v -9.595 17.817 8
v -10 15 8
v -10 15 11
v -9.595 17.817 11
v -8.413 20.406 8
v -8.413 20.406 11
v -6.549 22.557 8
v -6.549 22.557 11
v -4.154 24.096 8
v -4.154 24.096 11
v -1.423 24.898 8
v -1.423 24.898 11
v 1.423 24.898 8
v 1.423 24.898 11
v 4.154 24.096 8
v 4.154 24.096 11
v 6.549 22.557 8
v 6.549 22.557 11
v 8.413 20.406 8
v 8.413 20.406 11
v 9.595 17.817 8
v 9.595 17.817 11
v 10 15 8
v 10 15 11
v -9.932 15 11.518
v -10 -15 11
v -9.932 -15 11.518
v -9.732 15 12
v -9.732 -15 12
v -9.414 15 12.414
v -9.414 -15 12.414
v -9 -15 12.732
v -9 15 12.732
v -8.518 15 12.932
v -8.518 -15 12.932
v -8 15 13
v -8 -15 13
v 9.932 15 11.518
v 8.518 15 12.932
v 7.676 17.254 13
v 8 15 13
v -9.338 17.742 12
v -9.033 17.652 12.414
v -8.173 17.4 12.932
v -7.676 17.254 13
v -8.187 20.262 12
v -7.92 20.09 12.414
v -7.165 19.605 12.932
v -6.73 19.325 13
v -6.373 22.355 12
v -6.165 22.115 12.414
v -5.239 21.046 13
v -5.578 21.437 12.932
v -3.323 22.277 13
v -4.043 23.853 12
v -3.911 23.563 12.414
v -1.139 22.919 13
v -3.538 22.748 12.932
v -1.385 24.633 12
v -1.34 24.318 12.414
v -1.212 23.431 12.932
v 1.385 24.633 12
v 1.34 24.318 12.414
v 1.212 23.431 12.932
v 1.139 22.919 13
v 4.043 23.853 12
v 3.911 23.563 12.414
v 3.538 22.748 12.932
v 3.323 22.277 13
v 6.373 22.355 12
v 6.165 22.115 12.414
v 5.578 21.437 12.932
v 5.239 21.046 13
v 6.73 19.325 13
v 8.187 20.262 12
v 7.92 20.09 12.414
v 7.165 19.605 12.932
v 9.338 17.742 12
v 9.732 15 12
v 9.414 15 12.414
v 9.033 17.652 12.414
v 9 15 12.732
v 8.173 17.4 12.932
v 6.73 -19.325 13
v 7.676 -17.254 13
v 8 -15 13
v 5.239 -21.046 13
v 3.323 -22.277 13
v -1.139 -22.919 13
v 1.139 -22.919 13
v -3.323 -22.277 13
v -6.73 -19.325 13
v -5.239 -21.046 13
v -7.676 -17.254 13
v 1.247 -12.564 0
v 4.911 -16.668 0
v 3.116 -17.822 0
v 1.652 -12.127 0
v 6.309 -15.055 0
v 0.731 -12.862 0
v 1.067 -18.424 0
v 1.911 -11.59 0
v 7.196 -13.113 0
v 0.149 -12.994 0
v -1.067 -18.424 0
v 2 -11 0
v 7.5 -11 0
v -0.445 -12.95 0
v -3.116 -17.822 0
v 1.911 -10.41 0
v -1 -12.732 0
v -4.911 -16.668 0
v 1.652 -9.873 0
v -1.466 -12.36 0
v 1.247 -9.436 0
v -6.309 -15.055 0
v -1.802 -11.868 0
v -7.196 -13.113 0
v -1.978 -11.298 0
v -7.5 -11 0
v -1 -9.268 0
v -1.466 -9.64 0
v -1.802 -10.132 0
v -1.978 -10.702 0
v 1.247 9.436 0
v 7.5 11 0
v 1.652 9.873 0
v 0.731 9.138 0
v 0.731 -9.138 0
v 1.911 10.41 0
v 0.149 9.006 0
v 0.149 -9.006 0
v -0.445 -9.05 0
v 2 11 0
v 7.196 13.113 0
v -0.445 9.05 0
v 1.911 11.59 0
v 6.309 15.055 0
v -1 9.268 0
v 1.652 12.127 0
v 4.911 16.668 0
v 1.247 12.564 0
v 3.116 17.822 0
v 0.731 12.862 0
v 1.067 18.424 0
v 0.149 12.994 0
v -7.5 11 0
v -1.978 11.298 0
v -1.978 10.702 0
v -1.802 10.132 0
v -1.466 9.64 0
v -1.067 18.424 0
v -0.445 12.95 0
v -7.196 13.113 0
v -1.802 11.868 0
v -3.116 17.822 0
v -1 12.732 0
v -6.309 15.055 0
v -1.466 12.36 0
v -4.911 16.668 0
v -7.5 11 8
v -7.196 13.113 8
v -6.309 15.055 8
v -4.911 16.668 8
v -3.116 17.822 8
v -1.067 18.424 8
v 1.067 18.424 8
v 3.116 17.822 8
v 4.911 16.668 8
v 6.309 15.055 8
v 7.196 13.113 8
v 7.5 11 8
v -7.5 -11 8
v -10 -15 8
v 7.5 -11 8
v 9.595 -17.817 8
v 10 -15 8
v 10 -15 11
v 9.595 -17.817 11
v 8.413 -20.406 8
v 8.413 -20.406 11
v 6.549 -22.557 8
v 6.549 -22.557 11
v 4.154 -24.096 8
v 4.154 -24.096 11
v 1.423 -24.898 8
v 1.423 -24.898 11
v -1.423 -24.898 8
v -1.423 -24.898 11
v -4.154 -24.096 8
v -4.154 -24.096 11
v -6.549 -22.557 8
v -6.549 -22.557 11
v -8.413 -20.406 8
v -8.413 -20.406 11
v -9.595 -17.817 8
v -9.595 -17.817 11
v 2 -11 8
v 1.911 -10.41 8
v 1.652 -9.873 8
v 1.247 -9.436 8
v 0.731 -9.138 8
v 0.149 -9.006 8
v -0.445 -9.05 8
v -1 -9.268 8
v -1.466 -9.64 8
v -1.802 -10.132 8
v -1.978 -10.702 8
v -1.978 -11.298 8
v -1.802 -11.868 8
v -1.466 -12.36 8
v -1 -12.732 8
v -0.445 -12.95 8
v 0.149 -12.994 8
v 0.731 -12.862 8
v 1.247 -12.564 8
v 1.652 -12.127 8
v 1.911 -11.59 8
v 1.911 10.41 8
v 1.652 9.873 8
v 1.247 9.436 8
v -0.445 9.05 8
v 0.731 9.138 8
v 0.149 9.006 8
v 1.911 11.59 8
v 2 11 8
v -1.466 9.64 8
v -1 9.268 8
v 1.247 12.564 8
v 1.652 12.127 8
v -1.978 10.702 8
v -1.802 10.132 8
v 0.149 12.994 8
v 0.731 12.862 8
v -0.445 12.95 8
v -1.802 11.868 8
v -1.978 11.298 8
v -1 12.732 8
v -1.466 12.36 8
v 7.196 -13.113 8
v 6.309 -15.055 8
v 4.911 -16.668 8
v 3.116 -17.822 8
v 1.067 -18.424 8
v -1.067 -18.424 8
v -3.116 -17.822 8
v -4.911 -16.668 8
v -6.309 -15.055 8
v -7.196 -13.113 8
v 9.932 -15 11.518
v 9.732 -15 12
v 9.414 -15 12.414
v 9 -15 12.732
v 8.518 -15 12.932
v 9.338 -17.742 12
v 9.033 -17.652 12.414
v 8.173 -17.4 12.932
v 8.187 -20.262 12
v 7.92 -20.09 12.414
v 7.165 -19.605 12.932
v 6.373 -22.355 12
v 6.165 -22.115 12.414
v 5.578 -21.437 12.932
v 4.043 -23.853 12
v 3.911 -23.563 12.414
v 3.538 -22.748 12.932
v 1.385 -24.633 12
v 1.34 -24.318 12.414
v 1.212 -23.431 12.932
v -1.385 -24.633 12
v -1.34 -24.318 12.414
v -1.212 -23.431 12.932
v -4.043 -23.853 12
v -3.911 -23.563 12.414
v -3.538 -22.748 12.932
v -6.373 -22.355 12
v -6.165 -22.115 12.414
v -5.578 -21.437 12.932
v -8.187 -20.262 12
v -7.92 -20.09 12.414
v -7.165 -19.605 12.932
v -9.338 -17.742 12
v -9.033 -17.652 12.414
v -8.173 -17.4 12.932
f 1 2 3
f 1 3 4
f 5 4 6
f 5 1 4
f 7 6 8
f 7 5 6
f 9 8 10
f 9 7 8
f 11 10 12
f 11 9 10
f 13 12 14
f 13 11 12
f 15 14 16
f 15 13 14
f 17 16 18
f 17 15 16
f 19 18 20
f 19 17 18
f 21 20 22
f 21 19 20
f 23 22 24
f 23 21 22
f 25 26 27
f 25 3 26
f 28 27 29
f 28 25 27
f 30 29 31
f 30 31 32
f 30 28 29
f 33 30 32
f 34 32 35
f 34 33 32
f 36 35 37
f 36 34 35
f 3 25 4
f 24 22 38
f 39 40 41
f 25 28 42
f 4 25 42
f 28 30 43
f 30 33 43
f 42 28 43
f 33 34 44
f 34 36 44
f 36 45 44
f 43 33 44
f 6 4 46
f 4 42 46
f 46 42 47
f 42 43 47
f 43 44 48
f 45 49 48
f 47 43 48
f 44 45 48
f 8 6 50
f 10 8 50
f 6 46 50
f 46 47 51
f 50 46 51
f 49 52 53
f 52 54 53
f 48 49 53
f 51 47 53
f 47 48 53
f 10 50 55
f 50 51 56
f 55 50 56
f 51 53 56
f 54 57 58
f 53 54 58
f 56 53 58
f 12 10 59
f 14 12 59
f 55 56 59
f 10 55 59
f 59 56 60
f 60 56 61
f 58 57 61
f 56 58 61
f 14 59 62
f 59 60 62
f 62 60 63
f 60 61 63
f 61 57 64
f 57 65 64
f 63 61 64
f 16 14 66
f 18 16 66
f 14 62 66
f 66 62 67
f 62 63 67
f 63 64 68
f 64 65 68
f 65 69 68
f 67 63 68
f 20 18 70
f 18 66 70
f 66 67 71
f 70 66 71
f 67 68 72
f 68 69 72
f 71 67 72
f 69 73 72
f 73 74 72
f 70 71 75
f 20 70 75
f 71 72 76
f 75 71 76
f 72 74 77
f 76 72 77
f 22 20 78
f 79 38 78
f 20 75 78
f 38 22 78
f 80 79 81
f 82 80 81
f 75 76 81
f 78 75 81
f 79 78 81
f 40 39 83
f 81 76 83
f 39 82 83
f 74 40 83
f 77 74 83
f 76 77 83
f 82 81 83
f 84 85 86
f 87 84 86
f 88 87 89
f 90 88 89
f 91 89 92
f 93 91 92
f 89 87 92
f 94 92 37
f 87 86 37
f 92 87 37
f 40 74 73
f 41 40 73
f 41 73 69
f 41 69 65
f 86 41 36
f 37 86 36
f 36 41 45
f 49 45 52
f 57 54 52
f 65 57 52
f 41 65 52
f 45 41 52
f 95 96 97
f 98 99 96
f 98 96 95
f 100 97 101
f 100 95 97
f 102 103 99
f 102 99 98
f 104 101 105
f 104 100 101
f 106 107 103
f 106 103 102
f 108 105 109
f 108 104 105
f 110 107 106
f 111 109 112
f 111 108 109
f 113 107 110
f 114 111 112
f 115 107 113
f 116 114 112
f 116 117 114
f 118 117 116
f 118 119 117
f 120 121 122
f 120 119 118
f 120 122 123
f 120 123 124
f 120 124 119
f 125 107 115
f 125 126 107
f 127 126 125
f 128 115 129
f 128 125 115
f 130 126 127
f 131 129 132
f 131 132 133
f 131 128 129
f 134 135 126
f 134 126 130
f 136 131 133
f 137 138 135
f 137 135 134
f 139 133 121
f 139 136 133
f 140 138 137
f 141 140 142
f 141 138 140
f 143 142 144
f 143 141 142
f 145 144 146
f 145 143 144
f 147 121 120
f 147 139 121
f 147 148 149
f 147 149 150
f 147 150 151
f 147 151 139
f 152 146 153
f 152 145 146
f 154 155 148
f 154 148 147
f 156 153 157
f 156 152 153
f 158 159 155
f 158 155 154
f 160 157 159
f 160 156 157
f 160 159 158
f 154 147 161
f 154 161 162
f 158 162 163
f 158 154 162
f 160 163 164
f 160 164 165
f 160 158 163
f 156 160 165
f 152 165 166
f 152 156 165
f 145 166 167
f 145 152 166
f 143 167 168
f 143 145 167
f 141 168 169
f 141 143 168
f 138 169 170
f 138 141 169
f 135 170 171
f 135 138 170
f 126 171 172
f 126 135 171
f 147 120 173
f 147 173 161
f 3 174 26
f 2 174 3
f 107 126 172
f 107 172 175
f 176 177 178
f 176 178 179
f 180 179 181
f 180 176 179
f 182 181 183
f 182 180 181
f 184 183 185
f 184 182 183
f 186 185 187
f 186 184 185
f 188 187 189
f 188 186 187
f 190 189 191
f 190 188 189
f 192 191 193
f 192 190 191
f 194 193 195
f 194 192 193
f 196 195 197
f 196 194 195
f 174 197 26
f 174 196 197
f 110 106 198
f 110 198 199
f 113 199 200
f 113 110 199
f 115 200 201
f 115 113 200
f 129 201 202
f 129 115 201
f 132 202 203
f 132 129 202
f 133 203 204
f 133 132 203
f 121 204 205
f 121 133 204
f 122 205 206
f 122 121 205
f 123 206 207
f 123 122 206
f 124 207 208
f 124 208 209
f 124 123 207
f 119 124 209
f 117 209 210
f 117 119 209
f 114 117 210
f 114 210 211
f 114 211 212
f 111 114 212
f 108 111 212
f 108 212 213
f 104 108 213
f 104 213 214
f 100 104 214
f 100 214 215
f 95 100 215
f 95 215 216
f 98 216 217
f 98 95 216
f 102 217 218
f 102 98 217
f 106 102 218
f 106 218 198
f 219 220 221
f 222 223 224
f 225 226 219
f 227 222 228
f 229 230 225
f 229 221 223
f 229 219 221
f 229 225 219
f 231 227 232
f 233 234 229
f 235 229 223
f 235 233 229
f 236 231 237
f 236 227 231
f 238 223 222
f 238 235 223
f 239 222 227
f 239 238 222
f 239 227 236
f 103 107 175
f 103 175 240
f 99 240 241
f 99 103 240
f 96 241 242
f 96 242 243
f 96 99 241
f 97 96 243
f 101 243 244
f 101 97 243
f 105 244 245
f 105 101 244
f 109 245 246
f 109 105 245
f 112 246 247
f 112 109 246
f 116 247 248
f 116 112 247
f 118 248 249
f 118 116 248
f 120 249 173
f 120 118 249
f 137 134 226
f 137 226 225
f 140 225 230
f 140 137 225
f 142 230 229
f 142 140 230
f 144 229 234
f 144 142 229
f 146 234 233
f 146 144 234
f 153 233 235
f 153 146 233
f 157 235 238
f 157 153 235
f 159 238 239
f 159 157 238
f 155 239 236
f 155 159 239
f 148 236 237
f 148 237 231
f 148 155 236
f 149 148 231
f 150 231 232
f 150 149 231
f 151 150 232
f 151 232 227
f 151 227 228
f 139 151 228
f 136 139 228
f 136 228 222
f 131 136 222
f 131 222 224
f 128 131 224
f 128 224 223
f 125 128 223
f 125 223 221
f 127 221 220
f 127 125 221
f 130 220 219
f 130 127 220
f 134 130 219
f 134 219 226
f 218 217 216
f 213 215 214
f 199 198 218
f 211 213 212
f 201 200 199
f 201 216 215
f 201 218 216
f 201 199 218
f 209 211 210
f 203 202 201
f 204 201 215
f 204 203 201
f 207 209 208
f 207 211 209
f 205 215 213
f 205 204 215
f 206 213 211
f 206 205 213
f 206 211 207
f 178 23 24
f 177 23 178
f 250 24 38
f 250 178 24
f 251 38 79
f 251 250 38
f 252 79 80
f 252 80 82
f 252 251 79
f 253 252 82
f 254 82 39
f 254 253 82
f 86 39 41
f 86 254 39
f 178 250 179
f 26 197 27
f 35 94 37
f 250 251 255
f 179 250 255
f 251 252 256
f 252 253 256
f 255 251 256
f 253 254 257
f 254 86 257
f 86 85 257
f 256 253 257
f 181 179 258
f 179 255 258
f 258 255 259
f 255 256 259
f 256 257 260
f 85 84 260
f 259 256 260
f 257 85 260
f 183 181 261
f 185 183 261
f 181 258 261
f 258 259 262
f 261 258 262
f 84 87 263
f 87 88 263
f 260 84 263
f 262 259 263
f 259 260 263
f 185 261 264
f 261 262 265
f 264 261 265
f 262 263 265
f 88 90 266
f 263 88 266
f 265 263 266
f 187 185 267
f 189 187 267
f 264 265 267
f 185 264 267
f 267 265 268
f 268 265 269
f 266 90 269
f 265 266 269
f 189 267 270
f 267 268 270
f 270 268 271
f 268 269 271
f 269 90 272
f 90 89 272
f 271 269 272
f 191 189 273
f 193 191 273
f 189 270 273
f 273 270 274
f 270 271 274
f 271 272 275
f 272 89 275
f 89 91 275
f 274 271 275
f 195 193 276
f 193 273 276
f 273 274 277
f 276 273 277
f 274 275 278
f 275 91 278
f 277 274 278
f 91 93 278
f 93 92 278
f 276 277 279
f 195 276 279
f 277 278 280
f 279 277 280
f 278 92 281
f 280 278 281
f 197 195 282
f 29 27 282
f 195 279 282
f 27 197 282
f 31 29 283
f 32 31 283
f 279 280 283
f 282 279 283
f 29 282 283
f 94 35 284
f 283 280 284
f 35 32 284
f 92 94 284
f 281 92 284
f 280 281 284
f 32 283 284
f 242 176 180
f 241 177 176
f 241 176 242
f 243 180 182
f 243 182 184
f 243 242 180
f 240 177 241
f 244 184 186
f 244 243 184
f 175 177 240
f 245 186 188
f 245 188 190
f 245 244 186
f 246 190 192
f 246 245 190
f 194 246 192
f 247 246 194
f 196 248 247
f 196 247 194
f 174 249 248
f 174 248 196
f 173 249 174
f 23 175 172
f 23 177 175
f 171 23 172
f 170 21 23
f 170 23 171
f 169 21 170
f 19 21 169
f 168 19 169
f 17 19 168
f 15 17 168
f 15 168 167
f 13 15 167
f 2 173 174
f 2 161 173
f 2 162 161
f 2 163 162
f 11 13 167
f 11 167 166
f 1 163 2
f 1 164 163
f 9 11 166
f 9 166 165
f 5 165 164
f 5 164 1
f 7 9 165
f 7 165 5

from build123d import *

# Parameters (mm, degrees)
SKETCH_2_R      = 2
EXTRUDE_1_DEPTH = 8
EXTRUDE_2_DEPTH = 5
FILLET_1_R      = 2


with BuildPart() as part:
    # 草图2 → 凸台-拉伸1 (new body)
    with BuildSketch(Plane.XY):
        with BuildLine():
            Line((-7.5, -11), (-7.5, 11))
            ThreePointArc((-7.5, 11), (0, 18.5), (7.5, 11))
            Line((7.5, 11), (7.5, -11))
            ThreePointArc((7.5, -11), (0, -18.5), (-7.5, -11))
        make_face()
        with Locations((0, -11)):
            Circle(SKETCH_2_R, mode=Mode.SUBTRACT)
        with Locations((0, 11)):
            Circle(SKETCH_2_R, mode=Mode.SUBTRACT)
    extrude(amount=EXTRUDE_1_DEPTH)

    # 草图3 → 凸台-拉伸2 (add)
    with BuildSketch(Plane.XY.offset(8)):
        with BuildLine():
            Line((-10, -15), (-10, 15))
            ThreePointArc((-10, 15), (0, 25), (10, 15))
            Line((10, 15), (10, -15))
            ThreePointArc((10, -15), (0, -25), (-10, -15))
        make_face()
    extrude(amount=EXTRUDE_2_DEPTH)

    # 圆角1
    fillet_1_edges = [part.edges().sort_by_distance(p)[0] for p in [
        (0, -25, 13),
        (10, 0, 13),
        (0, 25, 13),
        (-10, 0, 13),
    ]]
    fillet(fillet_1_edges, radius=FILLET_1_R)


solid = part.part
